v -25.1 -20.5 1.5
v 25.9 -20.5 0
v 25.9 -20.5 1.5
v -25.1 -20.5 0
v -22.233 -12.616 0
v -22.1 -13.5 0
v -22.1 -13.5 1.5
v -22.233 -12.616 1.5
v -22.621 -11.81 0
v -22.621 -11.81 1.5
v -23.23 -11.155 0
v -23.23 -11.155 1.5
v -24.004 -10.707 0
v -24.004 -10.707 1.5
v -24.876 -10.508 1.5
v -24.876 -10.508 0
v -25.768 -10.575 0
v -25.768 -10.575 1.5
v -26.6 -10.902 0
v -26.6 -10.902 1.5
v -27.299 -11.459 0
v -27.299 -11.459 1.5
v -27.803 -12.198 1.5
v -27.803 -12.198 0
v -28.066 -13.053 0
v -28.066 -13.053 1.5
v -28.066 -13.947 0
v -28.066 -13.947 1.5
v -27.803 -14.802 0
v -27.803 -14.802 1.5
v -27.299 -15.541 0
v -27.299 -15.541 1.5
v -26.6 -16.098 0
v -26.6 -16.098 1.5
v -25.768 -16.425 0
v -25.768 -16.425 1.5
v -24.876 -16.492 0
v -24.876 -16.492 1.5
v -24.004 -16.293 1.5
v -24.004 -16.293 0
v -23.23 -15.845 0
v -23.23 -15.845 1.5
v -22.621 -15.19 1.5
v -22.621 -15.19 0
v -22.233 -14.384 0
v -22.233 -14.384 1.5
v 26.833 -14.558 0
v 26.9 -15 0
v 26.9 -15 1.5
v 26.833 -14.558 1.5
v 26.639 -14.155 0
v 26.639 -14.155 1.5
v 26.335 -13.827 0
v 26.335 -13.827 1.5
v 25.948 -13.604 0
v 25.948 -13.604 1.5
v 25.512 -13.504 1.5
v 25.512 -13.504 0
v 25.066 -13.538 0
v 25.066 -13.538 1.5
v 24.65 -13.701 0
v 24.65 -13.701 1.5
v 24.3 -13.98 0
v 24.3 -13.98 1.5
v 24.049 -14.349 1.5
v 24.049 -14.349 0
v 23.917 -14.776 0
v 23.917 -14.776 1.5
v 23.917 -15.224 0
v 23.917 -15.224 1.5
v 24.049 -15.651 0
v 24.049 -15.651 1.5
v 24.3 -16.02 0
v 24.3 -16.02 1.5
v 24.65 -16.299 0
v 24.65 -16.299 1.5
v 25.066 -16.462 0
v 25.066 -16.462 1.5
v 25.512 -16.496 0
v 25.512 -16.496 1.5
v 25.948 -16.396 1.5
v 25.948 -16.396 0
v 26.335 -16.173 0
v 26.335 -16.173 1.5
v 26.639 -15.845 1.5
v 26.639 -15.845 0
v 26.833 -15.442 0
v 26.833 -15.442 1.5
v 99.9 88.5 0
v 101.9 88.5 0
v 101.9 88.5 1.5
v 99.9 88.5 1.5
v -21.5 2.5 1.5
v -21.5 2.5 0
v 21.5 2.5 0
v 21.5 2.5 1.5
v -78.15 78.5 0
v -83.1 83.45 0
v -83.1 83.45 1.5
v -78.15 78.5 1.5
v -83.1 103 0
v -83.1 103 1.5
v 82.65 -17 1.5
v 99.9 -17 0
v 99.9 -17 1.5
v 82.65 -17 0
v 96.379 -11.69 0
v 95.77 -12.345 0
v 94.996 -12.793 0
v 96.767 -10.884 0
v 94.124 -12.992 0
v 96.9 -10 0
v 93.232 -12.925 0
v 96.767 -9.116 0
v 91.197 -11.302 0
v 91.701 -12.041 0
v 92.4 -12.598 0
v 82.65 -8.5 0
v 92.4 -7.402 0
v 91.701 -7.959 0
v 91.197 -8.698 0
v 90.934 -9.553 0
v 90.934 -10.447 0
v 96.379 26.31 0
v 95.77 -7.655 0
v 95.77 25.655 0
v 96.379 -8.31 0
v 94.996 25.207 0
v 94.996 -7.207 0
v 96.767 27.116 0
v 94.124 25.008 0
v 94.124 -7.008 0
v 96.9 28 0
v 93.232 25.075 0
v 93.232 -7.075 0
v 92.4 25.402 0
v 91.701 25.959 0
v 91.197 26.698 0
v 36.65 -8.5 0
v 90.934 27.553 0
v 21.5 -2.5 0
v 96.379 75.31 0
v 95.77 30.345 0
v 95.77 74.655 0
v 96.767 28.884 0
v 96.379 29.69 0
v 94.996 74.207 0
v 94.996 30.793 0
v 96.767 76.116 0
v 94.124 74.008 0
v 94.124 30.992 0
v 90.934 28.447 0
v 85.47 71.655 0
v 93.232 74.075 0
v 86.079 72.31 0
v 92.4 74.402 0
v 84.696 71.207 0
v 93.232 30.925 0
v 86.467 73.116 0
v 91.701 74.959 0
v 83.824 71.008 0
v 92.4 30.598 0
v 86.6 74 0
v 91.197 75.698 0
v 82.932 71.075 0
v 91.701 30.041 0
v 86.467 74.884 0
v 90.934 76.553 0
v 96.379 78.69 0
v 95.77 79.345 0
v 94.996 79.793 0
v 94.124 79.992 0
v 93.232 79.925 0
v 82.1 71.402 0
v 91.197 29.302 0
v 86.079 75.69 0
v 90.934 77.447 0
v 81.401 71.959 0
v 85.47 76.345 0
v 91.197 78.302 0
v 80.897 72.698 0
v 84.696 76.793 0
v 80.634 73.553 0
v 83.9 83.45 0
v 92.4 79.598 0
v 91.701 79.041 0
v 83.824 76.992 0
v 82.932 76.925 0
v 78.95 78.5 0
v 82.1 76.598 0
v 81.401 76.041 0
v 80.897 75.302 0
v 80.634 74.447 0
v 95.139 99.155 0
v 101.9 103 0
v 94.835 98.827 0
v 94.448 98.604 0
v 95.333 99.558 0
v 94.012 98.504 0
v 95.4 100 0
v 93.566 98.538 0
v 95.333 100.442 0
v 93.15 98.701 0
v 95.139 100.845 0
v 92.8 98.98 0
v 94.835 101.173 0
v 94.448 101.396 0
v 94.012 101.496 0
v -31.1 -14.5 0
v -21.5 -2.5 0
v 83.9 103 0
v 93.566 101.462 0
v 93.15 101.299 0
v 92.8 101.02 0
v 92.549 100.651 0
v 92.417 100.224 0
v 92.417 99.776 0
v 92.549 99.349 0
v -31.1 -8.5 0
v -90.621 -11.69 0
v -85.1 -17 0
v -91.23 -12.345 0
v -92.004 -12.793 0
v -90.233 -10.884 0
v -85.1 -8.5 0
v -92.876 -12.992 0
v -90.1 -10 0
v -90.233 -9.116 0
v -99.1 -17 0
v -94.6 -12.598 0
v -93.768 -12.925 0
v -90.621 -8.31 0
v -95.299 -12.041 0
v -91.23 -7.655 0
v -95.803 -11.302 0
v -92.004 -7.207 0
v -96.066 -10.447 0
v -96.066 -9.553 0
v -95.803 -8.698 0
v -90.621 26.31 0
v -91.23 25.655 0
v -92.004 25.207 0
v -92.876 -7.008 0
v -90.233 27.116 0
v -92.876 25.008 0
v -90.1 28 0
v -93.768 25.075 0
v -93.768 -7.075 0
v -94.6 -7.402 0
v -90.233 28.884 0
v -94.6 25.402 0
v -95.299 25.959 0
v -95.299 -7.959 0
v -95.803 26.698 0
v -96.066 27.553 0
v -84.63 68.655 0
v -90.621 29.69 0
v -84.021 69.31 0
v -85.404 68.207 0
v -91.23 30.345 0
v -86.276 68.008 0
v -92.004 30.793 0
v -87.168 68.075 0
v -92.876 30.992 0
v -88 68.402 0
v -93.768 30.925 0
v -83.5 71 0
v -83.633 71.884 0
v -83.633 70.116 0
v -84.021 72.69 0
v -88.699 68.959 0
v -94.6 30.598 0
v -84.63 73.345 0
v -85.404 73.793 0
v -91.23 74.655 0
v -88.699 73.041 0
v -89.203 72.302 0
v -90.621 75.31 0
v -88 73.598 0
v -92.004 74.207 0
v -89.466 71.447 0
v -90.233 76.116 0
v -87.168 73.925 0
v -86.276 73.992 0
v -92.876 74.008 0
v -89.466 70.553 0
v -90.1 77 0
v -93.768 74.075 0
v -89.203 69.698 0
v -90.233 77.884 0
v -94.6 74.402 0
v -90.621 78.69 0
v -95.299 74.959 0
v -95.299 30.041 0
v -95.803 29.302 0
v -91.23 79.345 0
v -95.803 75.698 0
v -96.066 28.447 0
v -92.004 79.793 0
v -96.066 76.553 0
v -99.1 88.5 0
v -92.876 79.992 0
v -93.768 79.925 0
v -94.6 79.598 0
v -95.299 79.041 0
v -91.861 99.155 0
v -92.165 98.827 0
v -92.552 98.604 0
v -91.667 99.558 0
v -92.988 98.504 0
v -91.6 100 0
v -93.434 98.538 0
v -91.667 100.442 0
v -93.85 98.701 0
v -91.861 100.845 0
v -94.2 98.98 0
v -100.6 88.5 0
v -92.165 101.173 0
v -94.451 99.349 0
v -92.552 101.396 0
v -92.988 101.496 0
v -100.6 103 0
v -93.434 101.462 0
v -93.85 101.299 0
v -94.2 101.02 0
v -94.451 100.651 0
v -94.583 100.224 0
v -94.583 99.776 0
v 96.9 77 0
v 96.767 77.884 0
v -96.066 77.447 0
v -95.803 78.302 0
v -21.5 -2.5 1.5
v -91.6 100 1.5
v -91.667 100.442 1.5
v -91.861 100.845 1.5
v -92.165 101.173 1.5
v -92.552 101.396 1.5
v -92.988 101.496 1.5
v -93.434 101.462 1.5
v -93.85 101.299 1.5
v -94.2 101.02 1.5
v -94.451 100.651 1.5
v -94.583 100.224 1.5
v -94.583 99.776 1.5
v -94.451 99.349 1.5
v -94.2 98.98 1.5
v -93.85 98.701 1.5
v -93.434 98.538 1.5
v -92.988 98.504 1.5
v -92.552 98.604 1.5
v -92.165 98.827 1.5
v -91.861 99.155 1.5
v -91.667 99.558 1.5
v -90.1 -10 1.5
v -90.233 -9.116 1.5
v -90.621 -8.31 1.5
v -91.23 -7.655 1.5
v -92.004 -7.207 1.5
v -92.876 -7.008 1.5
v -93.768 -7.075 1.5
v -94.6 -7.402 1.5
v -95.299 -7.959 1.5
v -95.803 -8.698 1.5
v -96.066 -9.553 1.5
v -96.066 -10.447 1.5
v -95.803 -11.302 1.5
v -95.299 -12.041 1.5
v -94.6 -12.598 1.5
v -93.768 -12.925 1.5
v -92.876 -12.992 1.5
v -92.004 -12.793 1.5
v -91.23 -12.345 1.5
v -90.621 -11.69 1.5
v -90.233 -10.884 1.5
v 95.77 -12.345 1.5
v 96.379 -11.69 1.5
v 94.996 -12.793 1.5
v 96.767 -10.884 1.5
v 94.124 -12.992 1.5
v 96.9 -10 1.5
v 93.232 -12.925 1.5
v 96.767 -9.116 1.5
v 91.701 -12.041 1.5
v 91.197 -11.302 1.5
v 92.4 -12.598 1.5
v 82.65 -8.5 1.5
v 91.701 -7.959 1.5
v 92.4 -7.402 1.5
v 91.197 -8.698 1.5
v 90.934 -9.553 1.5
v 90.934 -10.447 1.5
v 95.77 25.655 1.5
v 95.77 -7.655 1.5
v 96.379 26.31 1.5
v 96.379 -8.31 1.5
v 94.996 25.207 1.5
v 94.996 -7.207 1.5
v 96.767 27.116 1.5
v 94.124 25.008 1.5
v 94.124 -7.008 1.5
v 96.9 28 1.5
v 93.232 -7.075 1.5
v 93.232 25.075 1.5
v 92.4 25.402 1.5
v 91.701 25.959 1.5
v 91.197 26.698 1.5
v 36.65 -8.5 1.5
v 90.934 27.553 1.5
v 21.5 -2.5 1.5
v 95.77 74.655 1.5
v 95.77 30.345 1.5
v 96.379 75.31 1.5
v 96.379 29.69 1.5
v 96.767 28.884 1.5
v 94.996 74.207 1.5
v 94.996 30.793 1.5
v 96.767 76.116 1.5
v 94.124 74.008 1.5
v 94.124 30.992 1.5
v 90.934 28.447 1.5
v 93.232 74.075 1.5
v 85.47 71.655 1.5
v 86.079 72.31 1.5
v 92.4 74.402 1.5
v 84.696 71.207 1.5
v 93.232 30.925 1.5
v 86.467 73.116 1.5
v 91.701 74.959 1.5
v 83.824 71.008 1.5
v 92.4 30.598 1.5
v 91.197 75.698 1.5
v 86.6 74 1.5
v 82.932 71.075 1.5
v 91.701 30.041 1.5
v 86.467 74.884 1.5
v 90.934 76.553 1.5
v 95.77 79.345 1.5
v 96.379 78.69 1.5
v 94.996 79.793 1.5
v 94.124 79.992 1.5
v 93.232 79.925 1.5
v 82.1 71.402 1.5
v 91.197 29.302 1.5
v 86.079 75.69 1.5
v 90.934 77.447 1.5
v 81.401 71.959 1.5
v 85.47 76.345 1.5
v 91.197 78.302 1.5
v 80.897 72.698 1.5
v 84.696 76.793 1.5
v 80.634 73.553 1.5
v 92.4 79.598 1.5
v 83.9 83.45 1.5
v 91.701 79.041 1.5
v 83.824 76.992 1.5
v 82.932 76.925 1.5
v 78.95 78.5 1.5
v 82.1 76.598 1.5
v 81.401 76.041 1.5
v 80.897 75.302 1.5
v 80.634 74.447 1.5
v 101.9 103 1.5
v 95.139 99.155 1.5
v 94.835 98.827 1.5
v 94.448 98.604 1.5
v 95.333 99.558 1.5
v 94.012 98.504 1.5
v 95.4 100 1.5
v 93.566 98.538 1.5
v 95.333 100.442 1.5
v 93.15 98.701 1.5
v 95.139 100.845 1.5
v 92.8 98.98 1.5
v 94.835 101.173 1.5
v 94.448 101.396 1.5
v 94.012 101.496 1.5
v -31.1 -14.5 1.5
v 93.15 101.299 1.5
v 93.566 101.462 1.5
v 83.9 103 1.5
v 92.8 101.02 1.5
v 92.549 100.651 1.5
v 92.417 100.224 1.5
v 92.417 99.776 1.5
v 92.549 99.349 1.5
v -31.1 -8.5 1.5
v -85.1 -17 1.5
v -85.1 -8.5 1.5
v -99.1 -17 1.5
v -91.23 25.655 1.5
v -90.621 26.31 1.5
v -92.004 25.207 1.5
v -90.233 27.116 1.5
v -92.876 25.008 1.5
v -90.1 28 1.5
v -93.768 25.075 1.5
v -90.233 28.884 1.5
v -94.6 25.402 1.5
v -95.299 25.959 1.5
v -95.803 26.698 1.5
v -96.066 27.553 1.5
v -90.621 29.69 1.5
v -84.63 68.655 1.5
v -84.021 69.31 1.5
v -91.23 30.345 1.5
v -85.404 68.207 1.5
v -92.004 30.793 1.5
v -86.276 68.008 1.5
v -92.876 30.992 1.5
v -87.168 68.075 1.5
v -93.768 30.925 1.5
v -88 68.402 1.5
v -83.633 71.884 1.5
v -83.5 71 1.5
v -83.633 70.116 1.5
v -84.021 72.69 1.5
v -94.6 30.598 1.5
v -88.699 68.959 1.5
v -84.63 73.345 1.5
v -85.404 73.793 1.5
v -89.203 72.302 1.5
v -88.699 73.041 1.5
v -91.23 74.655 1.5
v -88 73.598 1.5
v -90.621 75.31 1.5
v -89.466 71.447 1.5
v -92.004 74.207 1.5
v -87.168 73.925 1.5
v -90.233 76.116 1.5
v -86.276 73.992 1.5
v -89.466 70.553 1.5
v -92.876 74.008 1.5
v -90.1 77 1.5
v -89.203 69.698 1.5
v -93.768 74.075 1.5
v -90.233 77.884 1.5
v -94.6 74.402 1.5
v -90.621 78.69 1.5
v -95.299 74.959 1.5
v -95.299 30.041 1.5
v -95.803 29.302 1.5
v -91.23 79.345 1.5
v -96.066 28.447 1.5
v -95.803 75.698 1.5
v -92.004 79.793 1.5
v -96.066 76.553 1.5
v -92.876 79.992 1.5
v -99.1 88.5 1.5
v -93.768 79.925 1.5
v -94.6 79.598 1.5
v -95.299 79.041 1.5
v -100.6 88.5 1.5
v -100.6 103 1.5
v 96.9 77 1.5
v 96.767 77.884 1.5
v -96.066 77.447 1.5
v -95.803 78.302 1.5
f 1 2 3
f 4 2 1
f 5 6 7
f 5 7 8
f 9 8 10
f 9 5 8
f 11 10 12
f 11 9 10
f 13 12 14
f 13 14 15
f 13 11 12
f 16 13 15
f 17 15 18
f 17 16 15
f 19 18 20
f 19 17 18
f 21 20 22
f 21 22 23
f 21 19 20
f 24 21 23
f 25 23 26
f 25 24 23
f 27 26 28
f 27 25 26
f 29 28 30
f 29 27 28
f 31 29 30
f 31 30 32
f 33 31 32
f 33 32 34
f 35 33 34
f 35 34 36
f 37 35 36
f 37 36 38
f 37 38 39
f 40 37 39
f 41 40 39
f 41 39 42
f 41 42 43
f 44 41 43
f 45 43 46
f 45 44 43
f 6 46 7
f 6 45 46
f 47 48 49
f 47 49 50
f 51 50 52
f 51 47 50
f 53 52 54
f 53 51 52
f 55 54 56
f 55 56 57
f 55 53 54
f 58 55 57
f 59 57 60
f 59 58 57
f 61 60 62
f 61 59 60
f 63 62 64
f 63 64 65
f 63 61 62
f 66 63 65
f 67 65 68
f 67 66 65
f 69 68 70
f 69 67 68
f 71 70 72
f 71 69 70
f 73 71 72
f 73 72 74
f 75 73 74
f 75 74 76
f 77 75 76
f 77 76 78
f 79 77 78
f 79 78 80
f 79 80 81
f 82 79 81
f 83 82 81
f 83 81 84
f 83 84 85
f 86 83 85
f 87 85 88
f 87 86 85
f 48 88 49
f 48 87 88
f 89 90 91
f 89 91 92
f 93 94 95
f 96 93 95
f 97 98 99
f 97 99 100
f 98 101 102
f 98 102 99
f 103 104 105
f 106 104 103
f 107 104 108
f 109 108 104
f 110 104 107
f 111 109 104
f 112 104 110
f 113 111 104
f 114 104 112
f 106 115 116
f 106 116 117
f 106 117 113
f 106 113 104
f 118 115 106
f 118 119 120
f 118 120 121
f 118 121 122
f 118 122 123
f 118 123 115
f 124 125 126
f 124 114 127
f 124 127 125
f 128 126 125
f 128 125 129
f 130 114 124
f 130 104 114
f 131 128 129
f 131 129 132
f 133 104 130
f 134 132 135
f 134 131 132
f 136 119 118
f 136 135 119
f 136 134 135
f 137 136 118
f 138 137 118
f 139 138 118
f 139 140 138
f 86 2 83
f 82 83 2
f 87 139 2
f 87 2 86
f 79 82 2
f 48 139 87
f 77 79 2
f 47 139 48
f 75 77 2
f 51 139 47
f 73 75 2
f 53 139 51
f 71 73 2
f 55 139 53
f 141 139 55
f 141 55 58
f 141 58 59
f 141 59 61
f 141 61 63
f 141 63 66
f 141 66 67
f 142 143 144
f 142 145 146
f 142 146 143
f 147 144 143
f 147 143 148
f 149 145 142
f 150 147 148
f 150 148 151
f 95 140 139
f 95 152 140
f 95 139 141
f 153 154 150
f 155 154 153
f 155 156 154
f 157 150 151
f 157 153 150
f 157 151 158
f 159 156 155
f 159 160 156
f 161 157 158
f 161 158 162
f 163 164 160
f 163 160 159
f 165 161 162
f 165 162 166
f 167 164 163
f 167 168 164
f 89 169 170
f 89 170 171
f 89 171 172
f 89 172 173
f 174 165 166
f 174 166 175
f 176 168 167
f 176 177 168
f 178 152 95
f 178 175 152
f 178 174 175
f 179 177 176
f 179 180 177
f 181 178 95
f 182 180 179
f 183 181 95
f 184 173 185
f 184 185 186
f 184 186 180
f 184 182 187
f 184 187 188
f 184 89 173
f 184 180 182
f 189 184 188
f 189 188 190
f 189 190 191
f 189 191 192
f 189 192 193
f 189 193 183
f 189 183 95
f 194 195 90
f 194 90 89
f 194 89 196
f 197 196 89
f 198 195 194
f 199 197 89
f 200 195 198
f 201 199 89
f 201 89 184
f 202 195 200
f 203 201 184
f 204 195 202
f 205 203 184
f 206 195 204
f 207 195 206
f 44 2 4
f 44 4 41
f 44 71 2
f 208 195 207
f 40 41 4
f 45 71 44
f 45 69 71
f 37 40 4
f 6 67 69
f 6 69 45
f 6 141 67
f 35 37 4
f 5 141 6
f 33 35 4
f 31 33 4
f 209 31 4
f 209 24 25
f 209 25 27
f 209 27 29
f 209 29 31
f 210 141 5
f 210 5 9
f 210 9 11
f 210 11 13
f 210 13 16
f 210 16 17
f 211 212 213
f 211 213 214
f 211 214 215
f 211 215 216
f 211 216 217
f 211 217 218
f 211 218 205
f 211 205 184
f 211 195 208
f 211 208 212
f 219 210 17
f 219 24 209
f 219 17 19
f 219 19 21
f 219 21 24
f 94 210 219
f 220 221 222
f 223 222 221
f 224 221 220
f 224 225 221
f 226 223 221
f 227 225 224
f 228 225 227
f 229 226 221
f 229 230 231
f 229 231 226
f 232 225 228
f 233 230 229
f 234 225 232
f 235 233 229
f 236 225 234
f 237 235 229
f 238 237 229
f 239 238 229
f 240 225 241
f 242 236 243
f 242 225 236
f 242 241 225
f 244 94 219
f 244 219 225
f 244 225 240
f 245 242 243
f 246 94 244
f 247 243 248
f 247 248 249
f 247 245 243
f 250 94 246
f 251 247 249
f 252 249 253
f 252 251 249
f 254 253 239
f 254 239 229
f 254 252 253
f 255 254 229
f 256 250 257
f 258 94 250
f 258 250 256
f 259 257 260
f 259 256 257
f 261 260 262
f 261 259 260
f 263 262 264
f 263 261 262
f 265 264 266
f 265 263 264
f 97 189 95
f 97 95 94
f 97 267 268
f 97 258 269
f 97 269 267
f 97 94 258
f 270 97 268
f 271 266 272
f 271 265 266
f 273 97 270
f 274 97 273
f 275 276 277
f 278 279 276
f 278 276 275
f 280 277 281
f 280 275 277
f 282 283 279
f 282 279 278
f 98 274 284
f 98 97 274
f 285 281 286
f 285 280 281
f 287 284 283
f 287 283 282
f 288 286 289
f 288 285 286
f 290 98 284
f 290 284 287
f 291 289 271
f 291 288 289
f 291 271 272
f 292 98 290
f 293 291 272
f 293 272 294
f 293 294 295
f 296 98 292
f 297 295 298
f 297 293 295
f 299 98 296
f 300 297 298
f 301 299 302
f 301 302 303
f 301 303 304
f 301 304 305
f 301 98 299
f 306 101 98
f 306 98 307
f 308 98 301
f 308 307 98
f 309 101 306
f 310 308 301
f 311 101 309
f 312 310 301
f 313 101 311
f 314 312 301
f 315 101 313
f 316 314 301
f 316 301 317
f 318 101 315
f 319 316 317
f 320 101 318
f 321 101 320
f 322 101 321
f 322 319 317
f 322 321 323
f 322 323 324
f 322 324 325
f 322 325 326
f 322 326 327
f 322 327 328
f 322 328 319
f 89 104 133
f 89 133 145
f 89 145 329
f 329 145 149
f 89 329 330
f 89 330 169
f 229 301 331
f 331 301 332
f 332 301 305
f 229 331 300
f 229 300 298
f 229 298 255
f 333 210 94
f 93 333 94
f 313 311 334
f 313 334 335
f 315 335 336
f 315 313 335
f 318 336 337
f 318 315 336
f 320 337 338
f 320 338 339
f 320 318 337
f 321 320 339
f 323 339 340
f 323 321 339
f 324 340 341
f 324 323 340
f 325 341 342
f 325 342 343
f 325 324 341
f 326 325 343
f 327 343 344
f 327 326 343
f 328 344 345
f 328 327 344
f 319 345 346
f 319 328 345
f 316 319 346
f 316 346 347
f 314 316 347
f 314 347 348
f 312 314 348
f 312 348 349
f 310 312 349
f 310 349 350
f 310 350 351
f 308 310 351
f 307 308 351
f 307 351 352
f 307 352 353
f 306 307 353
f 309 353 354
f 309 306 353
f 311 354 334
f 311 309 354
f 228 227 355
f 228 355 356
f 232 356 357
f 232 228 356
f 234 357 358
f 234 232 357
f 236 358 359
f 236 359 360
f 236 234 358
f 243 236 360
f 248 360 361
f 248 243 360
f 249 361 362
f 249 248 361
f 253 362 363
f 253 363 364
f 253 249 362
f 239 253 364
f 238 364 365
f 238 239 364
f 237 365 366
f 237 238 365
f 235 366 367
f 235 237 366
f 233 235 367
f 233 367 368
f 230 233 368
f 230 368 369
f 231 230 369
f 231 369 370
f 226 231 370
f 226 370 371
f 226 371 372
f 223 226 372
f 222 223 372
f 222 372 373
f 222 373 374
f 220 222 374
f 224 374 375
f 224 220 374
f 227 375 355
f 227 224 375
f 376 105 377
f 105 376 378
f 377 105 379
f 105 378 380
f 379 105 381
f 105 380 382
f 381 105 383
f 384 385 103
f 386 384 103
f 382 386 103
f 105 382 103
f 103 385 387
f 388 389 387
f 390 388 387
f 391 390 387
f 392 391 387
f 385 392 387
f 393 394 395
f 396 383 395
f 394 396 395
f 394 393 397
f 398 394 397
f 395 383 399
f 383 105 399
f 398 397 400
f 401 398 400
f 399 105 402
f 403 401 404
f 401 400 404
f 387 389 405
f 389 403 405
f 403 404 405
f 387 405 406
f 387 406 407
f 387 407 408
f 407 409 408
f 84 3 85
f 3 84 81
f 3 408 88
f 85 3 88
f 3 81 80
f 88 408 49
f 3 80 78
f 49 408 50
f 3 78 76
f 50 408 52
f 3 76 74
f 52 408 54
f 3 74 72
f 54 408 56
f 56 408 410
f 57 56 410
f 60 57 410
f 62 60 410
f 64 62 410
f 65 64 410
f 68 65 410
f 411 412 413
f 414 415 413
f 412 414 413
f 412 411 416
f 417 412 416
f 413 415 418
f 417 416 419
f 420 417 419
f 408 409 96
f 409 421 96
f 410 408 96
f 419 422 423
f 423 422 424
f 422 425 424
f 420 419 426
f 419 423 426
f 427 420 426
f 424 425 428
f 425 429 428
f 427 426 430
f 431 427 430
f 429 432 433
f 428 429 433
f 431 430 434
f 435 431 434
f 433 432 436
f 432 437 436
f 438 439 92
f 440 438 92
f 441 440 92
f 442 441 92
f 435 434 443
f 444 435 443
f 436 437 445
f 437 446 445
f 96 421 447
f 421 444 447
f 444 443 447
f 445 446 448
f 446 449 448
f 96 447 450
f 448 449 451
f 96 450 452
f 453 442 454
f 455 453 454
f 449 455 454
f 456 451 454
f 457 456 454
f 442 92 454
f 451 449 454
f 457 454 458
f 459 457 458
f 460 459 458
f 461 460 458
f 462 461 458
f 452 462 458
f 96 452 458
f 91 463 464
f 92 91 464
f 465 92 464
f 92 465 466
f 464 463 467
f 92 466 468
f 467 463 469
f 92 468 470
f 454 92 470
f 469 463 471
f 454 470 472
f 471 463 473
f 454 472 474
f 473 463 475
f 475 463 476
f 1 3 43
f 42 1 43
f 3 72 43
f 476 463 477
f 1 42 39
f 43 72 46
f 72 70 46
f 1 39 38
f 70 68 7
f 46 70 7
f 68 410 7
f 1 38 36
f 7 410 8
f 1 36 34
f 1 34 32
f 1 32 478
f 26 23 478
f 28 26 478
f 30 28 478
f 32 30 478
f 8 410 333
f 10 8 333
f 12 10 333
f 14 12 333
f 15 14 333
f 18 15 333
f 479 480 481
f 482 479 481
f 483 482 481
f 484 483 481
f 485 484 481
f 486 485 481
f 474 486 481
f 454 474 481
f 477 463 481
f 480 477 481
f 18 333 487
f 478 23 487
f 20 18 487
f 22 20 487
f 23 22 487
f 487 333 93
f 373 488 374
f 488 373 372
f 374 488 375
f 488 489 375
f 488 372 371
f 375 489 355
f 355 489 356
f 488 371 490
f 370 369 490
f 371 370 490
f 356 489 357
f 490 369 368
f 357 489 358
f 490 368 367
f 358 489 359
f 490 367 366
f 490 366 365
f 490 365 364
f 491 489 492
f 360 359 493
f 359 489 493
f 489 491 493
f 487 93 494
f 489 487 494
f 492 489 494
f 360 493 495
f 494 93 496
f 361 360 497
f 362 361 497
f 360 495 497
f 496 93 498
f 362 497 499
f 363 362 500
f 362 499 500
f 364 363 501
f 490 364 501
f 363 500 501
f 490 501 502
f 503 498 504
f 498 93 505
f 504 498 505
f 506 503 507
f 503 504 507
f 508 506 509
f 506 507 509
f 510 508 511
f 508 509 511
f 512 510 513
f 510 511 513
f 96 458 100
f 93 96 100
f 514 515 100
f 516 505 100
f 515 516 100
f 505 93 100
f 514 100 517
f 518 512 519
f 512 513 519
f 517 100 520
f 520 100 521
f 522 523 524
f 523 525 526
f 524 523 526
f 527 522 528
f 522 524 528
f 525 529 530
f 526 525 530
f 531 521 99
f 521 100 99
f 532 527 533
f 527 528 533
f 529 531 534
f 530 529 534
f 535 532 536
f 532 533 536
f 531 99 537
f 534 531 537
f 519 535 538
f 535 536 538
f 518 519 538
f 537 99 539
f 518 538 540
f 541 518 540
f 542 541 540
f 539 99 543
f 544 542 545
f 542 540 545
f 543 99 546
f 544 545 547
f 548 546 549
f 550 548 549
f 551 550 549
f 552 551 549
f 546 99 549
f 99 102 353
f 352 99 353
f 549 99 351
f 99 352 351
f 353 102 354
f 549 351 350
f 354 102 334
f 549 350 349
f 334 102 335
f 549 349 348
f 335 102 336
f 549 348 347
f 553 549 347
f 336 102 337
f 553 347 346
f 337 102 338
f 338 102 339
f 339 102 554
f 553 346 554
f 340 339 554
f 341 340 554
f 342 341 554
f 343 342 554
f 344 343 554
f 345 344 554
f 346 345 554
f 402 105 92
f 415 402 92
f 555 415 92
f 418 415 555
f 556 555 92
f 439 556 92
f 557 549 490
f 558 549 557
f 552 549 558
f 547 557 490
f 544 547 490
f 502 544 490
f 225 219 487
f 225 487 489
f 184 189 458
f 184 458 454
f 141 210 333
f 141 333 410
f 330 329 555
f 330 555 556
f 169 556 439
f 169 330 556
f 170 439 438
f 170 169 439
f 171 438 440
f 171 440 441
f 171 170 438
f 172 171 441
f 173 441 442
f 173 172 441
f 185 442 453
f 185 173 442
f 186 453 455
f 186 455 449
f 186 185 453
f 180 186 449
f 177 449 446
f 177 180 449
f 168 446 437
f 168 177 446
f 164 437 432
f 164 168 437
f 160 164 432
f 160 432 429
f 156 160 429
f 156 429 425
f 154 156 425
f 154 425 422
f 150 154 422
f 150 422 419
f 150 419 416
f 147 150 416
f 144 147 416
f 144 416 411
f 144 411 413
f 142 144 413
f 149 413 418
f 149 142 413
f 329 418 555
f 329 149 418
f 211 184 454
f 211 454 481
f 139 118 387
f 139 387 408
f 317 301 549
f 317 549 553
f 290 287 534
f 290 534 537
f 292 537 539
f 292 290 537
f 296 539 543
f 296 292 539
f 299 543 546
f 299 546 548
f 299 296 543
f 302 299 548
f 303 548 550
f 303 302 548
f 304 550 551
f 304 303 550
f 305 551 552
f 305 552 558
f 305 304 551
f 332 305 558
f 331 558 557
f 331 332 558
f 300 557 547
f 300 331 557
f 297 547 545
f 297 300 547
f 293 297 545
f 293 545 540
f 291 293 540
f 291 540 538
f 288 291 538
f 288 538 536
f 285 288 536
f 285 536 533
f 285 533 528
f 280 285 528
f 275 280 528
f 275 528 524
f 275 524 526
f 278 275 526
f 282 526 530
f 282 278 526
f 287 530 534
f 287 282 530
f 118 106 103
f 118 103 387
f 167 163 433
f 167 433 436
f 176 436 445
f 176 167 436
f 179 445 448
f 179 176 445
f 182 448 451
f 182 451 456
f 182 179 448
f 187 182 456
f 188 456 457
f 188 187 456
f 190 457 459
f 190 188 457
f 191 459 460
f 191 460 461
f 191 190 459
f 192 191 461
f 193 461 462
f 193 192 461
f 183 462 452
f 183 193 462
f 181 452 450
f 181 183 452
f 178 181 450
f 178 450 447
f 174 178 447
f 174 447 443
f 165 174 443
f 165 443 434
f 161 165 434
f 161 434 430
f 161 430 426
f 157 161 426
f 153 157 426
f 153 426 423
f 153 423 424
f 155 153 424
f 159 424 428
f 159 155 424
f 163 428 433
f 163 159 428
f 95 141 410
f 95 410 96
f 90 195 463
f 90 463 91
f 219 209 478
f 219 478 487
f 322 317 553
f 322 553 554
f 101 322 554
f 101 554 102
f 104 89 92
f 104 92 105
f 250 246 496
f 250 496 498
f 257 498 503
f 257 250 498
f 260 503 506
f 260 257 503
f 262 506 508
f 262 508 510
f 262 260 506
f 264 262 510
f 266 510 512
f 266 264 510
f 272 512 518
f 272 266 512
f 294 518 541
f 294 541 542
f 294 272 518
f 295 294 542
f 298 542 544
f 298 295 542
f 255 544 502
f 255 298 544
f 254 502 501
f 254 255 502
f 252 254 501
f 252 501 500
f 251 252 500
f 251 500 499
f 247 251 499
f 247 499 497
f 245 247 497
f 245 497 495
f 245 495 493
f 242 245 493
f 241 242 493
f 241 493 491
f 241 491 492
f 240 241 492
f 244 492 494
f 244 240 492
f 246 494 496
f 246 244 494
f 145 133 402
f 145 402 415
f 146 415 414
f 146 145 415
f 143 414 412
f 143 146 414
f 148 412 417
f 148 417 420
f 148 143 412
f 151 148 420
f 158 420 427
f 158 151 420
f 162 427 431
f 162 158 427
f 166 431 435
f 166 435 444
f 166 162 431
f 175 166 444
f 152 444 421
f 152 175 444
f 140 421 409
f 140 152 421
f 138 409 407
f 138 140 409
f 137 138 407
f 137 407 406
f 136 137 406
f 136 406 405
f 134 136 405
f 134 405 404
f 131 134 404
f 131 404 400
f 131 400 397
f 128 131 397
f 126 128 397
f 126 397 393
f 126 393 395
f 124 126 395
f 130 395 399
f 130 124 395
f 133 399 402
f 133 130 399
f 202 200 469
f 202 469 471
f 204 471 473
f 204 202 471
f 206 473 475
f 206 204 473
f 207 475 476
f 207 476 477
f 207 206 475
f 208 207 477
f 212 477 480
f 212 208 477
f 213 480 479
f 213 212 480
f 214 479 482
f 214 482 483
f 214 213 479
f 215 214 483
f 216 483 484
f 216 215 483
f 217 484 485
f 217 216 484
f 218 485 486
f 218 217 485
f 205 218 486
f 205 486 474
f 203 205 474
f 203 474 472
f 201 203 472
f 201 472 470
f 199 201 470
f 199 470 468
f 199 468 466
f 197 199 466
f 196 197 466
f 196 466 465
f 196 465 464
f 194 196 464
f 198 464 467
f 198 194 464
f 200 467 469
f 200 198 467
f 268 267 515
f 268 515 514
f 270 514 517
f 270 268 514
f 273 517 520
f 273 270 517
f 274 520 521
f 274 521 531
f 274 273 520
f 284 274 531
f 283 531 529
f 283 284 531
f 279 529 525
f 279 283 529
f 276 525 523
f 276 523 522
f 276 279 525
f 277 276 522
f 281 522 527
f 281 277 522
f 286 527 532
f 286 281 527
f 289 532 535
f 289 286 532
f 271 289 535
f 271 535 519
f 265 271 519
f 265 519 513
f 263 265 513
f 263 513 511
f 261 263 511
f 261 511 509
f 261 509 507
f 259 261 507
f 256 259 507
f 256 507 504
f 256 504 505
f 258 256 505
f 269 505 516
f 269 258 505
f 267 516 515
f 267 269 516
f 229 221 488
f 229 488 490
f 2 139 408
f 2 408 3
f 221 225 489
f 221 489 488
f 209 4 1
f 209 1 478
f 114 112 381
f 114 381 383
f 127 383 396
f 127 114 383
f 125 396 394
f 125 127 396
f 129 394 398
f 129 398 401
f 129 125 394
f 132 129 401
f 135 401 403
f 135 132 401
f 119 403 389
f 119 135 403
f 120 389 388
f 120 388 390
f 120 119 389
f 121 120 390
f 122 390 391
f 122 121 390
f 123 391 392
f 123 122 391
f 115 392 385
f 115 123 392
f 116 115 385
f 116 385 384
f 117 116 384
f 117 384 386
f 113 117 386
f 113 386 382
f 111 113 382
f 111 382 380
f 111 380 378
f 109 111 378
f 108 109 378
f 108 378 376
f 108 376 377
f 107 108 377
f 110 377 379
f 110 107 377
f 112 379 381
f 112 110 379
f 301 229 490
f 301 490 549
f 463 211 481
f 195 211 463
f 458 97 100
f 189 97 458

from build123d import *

# Parameters (mm, degrees)
SKETCH1_R           = 3
SKETCH1_R_2         = 1.5
SKETCH1_W           = 43
SKETCH1_H           = 5
BOSS_EXTRUDE1_DEPTH = 1.5


with BuildPart() as part:
    # Sketch1 → Boss-Extrude1 (new body)
    with BuildSketch(Plane.XY):
        Polygon((-100.6, 103), (-83.1, 103), (-83.1, 83.449747468), (-78.150252532, 78.5), (78.950252532, 78.5), (83.9, 83.449747468), (83.9, 103), (101.9, 103), (101.9, 88.5), (99.9, 88.5), (99.9, -17), (82.65, -17), (82.65, -8.5), (36.65, -8.5), (25.9, -20.5), (-25.1, -20.5), (-31.1, -14.5), (-31.1, -8.5), (-85.1, -8.5), (-85.1, -17), (-99.1, -17), (-99.1, 88.5), (-100.6, 88.5), align=None)
        with Locations((93.9, 77)):
            Circle(SKETCH1_R, mode=Mode.SUBTRACT)
        with Locations((83.6, 74)):
            Circle(SKETCH1_R, mode=Mode.SUBTRACT)
        with Locations((93.9, -10)):
            Circle(SKETCH1_R, mode=Mode.SUBTRACT)
        with Locations((93.9, 28)):
            Circle(SKETCH1_R, mode=Mode.SUBTRACT)
        with Locations((93.9, 100)):
            Circle(SKETCH1_R_2, mode=Mode.SUBTRACT)
        with Locations((25.4, -15)):
            Circle(SKETCH1_R_2, mode=Mode.SUBTRACT)
        with Locations((-25.1, -13.5)):
            Circle(SKETCH1_R, mode=Mode.SUBTRACT)
        with Locations((-93.1, -10)):
            Circle(SKETCH1_R, mode=Mode.SUBTRACT)
        with Locations((-93.1, 28)):
            Circle(SKETCH1_R, mode=Mode.SUBTRACT)
        with Locations((-93.1, 77)):
            Circle(SKETCH1_R, mode=Mode.SUBTRACT)
        with Locations((-86.5, 71)):
            Circle(SKETCH1_R, mode=Mode.SUBTRACT)
        with Locations((-93.1, 100)):
            Circle(SKETCH1_R_2, mode=Mode.SUBTRACT)
        Rectangle(SKETCH1_W, SKETCH1_H, mode=Mode.SUBTRACT)
    extrude(amount=BOSS_EXTRUDE1_DEPTH)


solid = part.part
